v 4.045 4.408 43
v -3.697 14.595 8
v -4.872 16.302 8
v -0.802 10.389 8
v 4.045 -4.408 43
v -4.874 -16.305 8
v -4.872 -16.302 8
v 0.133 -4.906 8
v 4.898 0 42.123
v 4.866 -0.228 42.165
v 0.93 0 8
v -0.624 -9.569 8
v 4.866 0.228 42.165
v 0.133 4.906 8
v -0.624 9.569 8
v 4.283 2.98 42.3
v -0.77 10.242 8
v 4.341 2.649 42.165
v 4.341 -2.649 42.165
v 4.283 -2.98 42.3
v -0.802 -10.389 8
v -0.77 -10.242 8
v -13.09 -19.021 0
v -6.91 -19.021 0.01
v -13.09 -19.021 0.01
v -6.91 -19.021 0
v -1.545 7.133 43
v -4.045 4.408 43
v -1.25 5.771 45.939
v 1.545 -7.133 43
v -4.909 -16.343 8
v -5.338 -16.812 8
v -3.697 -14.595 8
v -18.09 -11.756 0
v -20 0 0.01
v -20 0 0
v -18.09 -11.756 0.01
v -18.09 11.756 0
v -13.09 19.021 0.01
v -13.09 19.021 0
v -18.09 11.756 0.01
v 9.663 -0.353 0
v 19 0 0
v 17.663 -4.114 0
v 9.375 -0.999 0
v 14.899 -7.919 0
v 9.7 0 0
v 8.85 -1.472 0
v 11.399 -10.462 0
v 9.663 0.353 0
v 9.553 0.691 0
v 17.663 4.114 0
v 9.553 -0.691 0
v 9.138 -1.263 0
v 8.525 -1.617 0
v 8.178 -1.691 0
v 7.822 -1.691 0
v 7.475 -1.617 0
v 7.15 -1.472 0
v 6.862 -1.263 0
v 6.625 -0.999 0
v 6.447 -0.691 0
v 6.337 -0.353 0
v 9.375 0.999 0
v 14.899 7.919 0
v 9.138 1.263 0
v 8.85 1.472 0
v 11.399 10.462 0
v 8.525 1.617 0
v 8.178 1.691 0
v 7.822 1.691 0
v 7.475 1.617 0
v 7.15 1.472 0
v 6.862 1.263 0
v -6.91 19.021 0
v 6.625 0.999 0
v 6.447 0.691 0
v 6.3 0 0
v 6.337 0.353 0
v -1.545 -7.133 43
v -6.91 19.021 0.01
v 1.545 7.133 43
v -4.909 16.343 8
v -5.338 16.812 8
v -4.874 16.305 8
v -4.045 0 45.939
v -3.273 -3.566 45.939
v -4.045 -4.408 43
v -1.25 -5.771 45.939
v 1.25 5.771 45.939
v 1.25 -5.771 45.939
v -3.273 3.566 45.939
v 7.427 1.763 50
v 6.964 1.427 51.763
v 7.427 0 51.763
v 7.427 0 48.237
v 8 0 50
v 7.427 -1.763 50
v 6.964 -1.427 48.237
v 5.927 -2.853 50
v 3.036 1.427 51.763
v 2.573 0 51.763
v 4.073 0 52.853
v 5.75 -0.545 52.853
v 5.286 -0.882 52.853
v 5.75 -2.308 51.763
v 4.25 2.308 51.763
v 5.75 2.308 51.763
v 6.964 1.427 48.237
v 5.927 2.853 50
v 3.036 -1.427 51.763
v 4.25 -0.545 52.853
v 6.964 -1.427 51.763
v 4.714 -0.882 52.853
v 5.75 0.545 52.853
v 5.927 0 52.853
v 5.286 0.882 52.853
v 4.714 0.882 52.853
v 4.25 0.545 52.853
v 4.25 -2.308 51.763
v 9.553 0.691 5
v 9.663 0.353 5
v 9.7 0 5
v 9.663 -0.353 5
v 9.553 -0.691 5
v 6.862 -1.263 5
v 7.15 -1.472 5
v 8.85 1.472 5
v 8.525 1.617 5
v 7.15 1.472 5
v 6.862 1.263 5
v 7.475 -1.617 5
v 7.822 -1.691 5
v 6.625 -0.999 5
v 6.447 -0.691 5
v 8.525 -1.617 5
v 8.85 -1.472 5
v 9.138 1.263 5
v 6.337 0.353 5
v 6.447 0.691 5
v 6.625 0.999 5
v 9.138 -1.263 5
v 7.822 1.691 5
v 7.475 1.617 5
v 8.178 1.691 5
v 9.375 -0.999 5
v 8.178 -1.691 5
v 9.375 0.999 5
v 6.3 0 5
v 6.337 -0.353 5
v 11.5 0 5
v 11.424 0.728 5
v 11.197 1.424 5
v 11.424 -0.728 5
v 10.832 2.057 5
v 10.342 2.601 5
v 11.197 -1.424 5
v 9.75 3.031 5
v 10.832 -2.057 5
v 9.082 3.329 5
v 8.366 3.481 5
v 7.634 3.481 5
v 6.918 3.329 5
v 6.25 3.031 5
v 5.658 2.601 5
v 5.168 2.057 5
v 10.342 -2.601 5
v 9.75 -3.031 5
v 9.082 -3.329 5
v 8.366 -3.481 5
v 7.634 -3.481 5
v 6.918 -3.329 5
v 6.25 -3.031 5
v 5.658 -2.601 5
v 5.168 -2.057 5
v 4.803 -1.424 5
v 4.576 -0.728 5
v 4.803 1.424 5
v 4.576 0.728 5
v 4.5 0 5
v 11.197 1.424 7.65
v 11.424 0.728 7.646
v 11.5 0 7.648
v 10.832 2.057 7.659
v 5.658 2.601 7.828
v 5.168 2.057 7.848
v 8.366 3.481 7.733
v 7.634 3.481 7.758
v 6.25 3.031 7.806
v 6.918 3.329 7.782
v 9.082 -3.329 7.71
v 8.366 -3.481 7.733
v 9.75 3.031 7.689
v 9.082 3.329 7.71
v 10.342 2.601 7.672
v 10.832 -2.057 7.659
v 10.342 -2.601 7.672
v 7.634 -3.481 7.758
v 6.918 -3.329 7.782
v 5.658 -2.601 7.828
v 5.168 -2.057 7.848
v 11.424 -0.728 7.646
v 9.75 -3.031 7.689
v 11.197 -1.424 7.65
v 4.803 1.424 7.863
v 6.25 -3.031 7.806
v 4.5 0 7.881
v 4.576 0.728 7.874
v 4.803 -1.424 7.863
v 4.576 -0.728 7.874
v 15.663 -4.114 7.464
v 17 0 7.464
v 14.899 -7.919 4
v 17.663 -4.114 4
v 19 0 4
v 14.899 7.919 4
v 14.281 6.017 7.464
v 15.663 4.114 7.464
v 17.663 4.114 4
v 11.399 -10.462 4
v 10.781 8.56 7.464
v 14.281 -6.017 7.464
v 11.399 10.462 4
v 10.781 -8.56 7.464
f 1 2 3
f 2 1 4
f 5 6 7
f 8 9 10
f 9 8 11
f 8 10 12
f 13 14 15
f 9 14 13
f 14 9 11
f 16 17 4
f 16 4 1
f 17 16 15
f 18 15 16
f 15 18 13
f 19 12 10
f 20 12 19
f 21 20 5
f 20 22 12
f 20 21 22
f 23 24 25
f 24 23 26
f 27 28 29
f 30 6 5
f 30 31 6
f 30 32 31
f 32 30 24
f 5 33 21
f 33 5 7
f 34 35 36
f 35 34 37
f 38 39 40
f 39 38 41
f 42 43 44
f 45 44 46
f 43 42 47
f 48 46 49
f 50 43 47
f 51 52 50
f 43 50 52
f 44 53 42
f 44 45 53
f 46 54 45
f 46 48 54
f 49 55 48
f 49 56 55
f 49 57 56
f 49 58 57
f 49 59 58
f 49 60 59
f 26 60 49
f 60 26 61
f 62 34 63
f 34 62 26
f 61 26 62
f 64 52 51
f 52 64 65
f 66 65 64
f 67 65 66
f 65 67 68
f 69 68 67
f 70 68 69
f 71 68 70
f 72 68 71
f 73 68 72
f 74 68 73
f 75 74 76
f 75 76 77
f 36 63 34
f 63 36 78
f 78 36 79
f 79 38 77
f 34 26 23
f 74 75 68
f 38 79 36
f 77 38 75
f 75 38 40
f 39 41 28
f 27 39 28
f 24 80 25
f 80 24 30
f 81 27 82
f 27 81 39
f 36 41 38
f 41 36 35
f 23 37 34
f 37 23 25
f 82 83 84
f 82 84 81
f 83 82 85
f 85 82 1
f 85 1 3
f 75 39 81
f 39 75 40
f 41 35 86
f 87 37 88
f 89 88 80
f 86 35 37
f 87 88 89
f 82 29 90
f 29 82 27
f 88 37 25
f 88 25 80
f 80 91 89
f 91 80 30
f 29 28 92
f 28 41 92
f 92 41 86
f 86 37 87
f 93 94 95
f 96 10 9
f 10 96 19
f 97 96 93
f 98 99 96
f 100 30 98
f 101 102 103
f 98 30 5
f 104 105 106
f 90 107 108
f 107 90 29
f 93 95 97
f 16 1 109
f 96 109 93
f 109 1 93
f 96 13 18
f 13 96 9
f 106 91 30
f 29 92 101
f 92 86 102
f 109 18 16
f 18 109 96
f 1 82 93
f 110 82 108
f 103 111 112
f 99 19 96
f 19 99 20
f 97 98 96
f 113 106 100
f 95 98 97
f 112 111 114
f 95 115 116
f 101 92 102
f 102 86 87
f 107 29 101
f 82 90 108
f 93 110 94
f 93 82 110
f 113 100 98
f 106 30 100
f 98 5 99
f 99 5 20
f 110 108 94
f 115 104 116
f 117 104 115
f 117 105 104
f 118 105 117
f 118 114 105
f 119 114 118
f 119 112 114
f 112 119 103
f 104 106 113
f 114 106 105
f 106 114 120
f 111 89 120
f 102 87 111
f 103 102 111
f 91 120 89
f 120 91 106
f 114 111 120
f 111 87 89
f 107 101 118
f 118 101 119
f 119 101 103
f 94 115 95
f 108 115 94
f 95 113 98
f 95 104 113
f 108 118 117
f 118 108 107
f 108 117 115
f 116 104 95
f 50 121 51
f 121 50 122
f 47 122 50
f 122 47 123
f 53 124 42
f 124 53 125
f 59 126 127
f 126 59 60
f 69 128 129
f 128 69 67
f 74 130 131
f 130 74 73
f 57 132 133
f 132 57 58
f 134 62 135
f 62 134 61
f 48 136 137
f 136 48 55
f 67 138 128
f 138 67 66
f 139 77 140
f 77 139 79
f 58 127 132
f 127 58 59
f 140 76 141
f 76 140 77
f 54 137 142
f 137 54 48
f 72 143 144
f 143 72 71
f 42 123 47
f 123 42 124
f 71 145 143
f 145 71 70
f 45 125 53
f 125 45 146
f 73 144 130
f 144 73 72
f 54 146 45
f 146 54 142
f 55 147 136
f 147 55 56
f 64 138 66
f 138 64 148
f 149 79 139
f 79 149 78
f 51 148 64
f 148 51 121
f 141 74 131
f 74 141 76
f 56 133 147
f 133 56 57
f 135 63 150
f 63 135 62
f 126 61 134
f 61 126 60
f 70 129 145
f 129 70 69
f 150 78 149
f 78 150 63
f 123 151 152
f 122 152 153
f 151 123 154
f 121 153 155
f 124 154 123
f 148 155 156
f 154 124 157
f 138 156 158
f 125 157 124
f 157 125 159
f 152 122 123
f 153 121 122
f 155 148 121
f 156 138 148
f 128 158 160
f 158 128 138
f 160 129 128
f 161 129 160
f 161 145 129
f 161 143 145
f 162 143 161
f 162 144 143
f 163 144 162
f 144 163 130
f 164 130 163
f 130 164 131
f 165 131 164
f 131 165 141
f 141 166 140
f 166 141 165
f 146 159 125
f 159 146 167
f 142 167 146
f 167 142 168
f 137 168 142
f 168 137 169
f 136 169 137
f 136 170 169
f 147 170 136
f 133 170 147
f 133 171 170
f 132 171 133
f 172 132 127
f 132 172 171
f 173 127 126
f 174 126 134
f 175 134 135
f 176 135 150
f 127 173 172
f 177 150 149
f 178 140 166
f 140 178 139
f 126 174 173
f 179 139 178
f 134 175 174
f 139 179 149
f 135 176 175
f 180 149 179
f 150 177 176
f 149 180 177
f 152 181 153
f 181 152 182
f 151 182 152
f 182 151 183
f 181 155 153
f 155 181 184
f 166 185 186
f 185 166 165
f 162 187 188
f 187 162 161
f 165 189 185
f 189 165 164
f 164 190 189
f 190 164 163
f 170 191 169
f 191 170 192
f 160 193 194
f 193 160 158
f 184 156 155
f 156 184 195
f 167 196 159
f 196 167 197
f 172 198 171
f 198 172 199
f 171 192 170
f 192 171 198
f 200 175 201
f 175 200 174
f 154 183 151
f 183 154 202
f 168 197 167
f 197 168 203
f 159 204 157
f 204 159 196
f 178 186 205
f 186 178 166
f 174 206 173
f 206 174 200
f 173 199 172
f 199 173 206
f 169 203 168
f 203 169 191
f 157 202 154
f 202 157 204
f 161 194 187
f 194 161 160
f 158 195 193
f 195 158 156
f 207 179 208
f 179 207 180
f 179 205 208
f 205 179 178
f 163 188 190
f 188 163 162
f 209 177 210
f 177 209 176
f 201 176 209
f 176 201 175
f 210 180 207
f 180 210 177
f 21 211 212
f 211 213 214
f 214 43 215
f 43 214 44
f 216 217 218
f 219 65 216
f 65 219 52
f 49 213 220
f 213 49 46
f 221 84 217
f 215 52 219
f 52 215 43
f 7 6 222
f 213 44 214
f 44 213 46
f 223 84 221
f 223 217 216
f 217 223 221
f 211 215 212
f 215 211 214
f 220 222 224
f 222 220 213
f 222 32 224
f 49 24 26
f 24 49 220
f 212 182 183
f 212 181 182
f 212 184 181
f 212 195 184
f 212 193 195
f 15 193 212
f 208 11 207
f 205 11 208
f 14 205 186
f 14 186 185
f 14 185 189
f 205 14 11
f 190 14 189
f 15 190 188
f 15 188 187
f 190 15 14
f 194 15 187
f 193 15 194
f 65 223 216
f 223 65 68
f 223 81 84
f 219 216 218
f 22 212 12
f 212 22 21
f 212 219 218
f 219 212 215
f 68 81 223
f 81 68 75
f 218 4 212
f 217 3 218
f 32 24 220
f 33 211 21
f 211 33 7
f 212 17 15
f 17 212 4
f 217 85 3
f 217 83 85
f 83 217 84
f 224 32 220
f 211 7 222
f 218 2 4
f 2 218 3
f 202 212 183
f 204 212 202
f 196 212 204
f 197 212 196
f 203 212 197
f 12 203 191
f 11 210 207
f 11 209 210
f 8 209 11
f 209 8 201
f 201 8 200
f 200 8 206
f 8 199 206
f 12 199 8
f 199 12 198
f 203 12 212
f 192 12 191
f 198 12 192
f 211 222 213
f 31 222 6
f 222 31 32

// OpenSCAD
build_base();

/*[Global]*/
quality = 10;   //[10:10:120]

/*[Base]*/
screw_hole = 1;      //[1:yes,0:no]
base_screw_hole_offset = 8;
base_thickness = 8;
base_top_radius = 7;
base_smoothing = 4;

/*[Arm]*/
shoulder_radius = 10;
shoulder_offset = -10;
upper_arm_length = 35;
elbow_radius = 5;
elbow_offset = 0;
//Set to 0 if you don't want the end hook
fore_arm_length = 7;
fist_radius = 3;
//Set equal to Elbow Offset if you don't want the end hook
fist_offset = 5;

/*[Screw]*/
screw_shaft_radius = 1.7;
screw_head_radius = 3.5;
screw_head_depth = 3;

/* [Hidden] */

base_z = base_thickness - base_smoothing;
arm_len = upper_arm_length + base_thickness;
knob2_z = fore_arm_length + base_thickness + upper_arm_length;

module serial_hull()
  {
    // let i be the index of each of our children, but the last one
    for(i=[0:$children-2])
      hull() // we then create a hull between child i and i+1
      {
        children(i); // use child() in older versions of Openscad!
        children(i+1); // this shape is i in the next iteration!
      }
  }


module arm(){
    serial_hull(){
        translate([shoulder_offset,0,0]) scale([1,2,1]) cylinder(r=shoulder_radius,h=0.01,$fn=quality);
        translate([elbow_offset,0,arm_len]) scale([1,1.5,1]) sphere(r=elbow_radius,$fn=quality);
        translate([fist_offset,0,knob2_z]) scale([1,1,1]) sphere(r=fist_radius,$fn=quality);
    }
    
}

module base(){
    hull(){
        difference(){
            arm();
            translate([0,0,50+base_z + base_smoothing]) cube(size=100,center=true);
        }
        difference(){
            minkowski(){
                    translate([base_screw_hole_offset,0,0]) scale([1,1,1]) cylinder(r = base_top_radius, h=base_z,$fn=quality);
                sphere(r=base_smoothing,$fn=quality/2);
            }
            translate([0,0,-50]) cube(size=100,center=true);
        }
    }
}

module build_base(){
    arm();
    difference(){
        base();
        if(screw_hole==1){
            translate([base_screw_hole_offset,0,0]) cylinder(r=screw_shaft_radius,h = arm_len,$fn=30,center=true);
            translate([base_screw_hole_offset,0,base_z+base_smoothing-screw_head_depth]) cylinder(r=screw_head_radius,h=arm_len,$fn=30,center=false);
        }
    }
}
